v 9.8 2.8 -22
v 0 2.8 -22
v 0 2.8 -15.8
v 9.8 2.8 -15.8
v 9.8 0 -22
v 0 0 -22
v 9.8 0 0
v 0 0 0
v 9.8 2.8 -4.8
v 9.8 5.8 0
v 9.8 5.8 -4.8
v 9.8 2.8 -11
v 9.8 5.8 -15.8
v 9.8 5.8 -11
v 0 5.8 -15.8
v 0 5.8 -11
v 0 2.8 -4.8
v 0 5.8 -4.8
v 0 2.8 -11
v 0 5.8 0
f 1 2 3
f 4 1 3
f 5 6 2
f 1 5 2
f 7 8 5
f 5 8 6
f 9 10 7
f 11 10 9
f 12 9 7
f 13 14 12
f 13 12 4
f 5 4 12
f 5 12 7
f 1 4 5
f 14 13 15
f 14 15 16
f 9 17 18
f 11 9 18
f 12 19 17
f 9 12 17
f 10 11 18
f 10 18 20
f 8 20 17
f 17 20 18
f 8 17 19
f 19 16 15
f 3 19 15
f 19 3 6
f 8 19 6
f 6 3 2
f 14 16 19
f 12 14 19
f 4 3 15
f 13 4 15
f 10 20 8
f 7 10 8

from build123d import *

# Parameters (mm, degrees)
BOSS_EXTRUDE1_DEPTH = 9.8
LPATTERN1_COUNT     = 2
LPATTERN1_PITCH     = 11


with BuildPart() as part:
    # Sketch1 → Boss-Extrude1 (new body)
    with BuildSketch(Plane(origin=(0, 0, 0), x_dir=(0, 0, -1), z_dir=(1, 0, 0))):
        Polygon((0, 0), (4.8, 0), (11, 0), (11, 2.8), (4.8, 2.8), (4.8, 5.8), (0, 5.8), align=None)
    boss_extrude1 = extrude(amount=BOSS_EXTRUDE1_DEPTH)

    # LPattern1: Boss-Extrude1 ×2
    with Locations(*[(0, 0, -i * LPATTERN1_PITCH) for i in range(1, LPATTERN1_COUNT)]):
        add(boss_extrude1)


solid = part.part
